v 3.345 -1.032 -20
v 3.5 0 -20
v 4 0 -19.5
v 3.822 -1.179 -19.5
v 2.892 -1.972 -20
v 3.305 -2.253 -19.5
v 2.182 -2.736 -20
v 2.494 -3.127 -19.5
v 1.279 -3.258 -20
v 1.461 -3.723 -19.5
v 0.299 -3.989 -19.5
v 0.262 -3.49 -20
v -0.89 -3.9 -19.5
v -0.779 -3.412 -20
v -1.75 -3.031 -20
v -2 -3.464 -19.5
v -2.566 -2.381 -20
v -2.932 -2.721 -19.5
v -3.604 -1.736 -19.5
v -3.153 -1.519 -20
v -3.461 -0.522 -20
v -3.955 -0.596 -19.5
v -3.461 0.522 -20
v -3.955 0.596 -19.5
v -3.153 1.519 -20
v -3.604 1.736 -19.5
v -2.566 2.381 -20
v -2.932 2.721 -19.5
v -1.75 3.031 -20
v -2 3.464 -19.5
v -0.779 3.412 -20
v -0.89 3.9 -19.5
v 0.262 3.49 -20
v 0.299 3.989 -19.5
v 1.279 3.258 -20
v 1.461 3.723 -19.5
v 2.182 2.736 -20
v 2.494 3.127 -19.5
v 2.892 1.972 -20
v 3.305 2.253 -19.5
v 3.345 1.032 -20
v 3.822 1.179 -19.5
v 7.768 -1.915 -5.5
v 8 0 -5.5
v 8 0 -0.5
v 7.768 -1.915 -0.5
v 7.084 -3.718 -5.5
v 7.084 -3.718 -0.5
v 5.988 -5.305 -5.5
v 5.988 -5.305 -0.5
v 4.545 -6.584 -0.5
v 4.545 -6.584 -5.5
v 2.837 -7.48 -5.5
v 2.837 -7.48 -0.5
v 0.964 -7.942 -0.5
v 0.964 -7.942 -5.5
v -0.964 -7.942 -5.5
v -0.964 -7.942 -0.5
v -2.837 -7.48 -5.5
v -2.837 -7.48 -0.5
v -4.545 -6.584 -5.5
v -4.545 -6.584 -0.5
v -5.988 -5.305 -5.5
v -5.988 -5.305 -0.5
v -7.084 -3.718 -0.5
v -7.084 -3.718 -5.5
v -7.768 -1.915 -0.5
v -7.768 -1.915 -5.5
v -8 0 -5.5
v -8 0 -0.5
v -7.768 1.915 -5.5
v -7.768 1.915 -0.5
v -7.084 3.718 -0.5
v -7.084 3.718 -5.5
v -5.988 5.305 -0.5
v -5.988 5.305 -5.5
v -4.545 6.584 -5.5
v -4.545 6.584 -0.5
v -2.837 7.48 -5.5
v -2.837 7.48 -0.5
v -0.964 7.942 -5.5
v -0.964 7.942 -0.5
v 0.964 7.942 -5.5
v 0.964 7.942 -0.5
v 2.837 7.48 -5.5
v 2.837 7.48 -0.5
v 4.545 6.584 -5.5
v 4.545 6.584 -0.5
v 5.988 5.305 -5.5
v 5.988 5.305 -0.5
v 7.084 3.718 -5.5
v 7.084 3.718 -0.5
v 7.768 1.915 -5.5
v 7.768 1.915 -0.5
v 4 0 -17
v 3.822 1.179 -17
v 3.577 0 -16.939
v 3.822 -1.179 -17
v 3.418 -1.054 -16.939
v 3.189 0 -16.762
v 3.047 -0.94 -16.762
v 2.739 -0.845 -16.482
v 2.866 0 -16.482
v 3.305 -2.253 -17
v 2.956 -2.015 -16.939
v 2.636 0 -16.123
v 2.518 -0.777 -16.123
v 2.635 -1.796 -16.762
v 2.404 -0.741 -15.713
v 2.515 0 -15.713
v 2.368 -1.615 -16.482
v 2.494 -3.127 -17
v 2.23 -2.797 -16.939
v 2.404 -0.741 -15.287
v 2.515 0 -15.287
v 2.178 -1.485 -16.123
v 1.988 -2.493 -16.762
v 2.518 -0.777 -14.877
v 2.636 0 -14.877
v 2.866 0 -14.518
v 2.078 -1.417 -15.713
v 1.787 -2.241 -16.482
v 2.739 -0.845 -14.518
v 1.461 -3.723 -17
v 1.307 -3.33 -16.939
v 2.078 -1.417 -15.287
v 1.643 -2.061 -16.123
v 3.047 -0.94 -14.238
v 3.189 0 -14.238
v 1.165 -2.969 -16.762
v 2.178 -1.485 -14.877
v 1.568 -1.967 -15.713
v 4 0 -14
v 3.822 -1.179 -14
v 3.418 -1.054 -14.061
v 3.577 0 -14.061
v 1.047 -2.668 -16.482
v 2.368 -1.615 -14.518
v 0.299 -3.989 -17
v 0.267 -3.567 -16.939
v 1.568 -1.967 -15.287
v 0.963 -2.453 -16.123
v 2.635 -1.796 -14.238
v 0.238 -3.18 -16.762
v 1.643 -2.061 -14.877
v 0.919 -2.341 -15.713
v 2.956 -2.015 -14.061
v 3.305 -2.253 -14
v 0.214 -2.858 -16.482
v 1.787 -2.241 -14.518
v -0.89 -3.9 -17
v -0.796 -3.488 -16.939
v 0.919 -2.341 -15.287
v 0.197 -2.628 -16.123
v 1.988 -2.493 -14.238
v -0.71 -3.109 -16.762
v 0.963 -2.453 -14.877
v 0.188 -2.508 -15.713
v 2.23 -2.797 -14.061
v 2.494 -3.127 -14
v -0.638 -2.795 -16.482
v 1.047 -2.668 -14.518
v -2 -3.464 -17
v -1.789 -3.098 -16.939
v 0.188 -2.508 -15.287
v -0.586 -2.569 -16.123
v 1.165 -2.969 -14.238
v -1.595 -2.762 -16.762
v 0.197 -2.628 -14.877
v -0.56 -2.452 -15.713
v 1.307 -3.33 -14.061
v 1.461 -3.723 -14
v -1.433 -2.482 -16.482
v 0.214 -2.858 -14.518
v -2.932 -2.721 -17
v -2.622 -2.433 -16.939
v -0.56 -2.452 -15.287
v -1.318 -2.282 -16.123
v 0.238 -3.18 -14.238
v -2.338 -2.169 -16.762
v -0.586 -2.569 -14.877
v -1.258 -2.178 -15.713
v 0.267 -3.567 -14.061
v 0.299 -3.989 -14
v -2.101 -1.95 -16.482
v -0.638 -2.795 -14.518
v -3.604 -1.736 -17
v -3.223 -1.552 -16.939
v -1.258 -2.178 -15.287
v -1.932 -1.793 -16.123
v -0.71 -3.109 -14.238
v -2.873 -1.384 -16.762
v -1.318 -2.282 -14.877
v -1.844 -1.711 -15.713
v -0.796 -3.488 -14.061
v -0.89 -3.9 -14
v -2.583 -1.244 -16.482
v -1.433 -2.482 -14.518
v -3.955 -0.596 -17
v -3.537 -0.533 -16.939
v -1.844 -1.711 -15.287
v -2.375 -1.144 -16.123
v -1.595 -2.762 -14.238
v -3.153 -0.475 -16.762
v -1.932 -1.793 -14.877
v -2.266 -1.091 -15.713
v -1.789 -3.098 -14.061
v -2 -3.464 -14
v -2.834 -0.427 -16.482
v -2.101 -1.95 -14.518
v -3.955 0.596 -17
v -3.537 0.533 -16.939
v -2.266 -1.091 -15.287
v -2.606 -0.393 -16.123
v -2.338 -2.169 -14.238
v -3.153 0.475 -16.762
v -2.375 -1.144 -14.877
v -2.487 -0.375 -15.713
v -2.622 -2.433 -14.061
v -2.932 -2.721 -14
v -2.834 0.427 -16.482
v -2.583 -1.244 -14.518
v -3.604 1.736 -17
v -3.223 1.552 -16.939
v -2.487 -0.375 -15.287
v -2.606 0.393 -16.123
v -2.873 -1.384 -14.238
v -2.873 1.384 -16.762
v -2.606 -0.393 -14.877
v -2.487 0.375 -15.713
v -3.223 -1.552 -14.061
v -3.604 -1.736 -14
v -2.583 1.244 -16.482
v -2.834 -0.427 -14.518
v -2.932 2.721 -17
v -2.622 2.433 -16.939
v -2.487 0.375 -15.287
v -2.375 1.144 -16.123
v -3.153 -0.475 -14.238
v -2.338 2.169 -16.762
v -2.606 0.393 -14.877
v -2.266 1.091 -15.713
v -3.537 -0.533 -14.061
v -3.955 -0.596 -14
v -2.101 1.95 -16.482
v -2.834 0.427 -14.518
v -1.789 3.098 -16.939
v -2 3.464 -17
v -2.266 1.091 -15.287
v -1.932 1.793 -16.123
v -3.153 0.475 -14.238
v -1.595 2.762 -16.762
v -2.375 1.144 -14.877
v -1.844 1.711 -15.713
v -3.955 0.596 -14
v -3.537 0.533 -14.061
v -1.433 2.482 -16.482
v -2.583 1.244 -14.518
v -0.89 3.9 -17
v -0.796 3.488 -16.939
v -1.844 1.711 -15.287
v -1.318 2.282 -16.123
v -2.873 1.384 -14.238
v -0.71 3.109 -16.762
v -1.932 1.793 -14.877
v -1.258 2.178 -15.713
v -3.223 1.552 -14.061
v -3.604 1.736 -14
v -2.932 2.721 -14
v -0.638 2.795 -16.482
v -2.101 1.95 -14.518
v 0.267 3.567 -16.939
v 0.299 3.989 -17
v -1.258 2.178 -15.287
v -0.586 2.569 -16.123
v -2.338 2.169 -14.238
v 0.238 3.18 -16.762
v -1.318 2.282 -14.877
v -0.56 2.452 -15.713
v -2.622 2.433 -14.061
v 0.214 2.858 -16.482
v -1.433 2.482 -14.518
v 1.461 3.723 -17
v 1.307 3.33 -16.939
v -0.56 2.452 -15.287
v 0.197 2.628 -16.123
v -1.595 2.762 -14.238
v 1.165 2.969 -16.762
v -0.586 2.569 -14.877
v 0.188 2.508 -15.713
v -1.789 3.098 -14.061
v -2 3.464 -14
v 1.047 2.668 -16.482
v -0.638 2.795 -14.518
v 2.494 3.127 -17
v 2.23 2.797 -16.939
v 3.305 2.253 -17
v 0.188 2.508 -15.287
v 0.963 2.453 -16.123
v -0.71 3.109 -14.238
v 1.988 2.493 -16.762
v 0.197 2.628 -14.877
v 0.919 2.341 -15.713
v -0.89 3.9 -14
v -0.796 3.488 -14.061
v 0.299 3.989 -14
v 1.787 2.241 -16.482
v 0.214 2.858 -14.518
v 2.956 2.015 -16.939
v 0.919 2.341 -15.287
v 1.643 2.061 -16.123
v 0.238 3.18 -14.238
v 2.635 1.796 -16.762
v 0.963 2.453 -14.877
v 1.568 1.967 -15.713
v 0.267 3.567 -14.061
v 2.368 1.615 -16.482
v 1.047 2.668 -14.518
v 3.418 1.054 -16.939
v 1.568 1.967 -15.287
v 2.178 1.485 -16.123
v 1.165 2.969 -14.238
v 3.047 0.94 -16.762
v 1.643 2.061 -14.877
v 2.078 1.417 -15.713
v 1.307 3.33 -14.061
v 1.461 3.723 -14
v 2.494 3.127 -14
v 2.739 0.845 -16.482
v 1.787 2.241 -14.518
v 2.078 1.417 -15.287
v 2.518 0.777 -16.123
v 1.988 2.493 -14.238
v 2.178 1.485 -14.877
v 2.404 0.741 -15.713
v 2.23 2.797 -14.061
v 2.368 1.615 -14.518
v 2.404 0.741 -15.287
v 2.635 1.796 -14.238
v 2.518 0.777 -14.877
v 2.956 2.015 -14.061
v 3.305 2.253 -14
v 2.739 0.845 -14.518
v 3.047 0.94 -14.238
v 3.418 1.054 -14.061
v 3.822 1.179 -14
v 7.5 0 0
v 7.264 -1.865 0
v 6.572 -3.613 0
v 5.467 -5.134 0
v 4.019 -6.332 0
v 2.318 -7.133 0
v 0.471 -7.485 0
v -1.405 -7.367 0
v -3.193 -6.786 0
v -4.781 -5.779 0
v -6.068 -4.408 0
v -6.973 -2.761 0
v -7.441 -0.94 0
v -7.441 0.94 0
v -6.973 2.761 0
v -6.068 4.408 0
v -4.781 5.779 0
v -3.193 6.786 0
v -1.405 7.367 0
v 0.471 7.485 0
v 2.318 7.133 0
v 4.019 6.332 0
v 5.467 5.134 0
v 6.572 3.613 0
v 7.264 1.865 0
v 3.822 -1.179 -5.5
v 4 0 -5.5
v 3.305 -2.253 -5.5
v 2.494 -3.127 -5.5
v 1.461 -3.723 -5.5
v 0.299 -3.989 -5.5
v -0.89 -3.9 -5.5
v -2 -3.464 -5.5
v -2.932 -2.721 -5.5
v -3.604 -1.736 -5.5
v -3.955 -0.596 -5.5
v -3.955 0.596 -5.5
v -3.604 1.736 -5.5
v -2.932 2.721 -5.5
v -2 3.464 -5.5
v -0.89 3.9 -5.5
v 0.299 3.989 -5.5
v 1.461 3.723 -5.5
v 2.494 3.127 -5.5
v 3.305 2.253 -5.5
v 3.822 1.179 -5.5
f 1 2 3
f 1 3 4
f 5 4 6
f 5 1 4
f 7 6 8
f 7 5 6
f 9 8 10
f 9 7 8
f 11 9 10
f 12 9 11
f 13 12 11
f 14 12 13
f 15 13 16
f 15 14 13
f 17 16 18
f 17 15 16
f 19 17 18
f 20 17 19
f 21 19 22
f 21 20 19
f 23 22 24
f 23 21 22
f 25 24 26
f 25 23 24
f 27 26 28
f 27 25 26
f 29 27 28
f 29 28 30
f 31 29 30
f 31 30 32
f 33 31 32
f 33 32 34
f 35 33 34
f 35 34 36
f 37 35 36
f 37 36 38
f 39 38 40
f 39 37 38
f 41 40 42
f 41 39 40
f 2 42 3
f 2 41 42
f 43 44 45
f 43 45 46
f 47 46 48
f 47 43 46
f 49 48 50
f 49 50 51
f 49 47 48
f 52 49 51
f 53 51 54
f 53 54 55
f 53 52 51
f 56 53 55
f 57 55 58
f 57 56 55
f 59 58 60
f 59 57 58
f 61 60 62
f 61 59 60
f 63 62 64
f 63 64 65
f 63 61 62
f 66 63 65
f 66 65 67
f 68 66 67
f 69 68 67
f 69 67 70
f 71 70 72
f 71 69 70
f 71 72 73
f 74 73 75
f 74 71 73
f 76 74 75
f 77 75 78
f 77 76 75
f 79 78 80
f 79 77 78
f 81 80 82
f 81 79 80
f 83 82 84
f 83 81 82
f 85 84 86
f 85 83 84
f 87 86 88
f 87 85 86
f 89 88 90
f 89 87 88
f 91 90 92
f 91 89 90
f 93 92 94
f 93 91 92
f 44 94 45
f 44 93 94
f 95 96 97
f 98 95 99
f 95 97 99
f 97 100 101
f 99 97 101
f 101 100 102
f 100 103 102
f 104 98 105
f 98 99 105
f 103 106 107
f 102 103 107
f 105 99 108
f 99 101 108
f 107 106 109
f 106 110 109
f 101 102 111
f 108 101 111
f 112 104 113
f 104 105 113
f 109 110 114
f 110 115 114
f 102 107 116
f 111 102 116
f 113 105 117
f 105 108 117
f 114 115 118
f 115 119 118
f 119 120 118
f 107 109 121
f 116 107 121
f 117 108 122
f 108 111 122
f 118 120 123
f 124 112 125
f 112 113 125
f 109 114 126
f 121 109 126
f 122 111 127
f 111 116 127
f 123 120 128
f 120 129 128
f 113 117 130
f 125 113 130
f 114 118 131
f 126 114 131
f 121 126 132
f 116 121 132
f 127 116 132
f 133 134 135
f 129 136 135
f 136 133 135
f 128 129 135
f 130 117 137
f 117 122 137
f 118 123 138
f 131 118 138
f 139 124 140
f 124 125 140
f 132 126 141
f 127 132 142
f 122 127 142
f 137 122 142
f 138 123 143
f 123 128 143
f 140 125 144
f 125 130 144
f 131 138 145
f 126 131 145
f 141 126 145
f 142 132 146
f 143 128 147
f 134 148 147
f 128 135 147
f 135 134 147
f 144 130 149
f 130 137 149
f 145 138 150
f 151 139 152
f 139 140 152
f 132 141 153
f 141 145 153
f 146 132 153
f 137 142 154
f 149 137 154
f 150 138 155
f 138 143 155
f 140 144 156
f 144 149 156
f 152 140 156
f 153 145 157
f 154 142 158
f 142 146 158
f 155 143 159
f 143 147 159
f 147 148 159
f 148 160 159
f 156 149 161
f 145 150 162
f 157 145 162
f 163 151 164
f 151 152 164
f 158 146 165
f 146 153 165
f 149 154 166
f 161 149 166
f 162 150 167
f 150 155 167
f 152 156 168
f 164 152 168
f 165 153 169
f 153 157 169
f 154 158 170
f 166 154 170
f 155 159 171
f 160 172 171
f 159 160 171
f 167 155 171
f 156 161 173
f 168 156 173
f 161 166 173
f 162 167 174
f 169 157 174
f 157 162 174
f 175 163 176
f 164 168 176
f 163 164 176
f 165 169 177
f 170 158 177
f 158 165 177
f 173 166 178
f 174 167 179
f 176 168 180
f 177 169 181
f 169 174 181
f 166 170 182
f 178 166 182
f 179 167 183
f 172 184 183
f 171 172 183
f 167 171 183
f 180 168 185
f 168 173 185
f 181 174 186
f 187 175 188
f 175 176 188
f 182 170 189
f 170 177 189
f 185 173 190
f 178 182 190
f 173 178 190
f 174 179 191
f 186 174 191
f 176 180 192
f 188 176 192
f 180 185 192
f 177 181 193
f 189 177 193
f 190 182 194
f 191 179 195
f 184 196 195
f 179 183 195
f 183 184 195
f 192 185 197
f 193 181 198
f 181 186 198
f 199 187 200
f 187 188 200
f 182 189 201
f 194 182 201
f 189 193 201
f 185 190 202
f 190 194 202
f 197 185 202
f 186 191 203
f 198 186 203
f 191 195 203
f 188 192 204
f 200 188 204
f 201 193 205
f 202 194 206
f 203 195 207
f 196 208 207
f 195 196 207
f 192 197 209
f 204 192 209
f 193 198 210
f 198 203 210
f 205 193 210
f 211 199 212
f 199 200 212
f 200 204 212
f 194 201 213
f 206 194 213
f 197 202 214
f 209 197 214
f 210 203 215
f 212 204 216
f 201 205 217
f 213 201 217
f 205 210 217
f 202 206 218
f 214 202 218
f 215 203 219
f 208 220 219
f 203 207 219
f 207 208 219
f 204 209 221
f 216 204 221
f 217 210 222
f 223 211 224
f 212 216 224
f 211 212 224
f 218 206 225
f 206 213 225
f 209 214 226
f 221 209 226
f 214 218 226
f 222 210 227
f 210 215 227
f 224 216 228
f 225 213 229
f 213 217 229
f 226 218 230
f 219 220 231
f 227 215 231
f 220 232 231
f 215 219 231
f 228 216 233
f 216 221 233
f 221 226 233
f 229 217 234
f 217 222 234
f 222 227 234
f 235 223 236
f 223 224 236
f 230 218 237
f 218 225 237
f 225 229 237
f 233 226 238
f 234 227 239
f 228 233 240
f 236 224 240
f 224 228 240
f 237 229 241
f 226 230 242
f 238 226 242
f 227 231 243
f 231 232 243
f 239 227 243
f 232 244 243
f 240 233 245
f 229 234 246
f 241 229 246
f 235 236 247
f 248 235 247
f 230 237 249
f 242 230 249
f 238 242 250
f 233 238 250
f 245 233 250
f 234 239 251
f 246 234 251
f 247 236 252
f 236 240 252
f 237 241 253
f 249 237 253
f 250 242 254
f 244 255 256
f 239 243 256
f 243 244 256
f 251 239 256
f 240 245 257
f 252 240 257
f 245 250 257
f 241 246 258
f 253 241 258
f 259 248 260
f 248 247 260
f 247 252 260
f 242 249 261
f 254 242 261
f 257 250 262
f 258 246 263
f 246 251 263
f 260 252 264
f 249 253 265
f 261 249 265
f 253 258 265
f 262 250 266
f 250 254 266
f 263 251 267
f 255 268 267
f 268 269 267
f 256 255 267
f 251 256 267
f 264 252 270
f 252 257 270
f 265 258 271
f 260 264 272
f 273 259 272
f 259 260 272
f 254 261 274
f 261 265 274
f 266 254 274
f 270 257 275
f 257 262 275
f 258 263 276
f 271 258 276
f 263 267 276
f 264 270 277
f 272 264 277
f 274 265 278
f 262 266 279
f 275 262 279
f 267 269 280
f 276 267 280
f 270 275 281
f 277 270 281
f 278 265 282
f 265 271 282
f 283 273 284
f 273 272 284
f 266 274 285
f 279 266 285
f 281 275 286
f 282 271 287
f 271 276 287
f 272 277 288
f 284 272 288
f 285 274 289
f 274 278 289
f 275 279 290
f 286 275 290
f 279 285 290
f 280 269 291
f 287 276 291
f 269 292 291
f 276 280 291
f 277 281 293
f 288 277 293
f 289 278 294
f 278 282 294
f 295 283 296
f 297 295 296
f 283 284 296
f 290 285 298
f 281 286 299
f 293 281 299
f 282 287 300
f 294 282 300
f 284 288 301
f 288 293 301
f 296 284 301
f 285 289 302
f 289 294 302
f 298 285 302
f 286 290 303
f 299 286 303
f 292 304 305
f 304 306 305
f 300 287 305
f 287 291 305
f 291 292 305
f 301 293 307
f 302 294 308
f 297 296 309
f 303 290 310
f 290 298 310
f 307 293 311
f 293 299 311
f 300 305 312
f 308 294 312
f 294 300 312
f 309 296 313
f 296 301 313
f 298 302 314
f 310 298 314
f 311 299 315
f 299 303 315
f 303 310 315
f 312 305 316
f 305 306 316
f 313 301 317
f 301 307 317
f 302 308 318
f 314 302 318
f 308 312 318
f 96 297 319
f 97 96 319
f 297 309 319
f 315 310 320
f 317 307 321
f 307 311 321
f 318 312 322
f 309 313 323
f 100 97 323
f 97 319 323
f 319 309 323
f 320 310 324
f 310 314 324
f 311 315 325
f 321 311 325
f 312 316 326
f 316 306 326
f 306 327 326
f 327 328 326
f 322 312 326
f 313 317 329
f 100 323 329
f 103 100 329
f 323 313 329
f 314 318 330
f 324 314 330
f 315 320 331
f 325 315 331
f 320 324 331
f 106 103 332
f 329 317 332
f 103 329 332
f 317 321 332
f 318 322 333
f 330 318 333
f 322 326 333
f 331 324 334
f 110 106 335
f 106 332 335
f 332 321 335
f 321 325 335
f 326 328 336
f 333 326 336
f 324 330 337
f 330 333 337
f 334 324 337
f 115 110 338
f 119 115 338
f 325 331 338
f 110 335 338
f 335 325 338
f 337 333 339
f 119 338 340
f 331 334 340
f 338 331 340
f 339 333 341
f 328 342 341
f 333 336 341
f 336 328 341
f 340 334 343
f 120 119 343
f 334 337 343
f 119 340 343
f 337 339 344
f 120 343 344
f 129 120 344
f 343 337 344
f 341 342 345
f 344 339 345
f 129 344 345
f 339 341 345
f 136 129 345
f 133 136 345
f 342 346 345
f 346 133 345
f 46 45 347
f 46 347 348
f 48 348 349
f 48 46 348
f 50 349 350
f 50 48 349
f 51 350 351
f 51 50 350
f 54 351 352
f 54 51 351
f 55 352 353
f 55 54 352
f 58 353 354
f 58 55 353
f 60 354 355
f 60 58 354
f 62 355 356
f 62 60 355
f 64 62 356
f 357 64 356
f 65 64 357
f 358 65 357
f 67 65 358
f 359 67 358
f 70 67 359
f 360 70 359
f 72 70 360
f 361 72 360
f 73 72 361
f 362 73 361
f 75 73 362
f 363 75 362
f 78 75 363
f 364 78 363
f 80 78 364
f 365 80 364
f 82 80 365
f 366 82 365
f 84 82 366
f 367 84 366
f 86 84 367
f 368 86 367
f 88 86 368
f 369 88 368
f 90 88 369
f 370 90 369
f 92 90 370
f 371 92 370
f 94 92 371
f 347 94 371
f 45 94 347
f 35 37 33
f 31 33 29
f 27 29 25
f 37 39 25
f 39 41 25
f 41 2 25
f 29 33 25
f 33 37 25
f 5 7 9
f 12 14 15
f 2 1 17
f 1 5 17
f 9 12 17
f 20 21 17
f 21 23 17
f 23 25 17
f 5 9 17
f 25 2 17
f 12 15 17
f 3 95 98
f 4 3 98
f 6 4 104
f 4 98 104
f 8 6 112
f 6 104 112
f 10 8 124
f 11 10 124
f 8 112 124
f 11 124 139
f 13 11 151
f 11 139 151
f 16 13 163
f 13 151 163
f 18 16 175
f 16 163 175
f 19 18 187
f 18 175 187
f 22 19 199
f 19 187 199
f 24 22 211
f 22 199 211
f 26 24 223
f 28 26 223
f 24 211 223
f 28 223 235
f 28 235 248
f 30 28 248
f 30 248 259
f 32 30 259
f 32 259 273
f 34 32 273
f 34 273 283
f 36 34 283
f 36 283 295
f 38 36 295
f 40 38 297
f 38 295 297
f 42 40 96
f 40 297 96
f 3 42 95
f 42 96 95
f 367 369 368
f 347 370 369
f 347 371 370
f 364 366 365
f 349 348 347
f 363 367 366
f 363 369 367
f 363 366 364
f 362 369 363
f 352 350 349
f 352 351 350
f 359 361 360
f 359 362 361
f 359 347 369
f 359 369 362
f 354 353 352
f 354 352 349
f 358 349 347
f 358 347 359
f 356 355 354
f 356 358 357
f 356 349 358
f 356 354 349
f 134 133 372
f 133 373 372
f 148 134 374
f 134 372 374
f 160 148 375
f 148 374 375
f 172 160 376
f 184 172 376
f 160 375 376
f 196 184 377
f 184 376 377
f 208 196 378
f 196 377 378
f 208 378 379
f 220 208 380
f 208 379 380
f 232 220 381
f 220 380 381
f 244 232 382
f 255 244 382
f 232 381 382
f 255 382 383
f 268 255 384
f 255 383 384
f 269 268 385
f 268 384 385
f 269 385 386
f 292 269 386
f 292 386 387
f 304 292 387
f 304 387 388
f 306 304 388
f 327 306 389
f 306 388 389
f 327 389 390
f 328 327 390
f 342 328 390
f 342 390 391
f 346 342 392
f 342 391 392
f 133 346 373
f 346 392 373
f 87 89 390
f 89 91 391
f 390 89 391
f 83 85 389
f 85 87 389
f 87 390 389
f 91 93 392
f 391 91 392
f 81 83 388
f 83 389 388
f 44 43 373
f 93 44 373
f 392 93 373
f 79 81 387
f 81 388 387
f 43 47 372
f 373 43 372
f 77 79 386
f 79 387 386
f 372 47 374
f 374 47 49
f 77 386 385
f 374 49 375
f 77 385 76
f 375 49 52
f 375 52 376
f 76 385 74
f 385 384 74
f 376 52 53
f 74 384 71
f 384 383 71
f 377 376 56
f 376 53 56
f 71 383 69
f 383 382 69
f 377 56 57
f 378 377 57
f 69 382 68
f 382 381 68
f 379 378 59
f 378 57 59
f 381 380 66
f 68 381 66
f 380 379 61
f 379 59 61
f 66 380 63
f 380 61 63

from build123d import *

# Parameters (mm, degrees)
SKETCH1_W     = 5.5
SKETCH1_H     = 8
CHAMFER1_SIZE = 0.5
CHAMFER2_SIZE = 0.5


with BuildPart() as part:
    # Sketch1 → Revolve1 (revolve)
    with BuildSketch(Plane(origin=(0, 0, 0), x_dir=(0, 0, -1), z_dir=(1, 0, 0)), mode=Mode.PRIVATE) as revolve1_sk:
        with Locations((2.75, 4)):
            Rectangle(SKETCH1_W, SKETCH1_H)
        with BuildLine():
            Line((5.5, 4), (5.5, 0))
            Line((5.5, 0), (20, 0))
            Line((20, 0), (20, 4))
            Line((20, 4), (17, 4))
            ThreePointArc((17, 4), (15.5, 2.5), (14, 4))
            Line((14, 4), (5.5, 4))
        make_face()
    revolve(revolve1_sk.sketch.rotate(Axis((0, 0, -5.5), (0, 0, -1)), 90), axis=Axis((0, 0, -5.5), (0, 0, -1)))

    # Chamfer1
    chamfer1_edges = [part.edges().sort_by_distance(p)[0] for p in [
        (-8, 0, 0),
    ]]
    chamfer(chamfer1_edges, length=CHAMFER1_SIZE)

    # Chamfer2
    chamfer2_edges = [part.edges().sort_by_distance(p)[0] for p in [
        (-4, 0, -20),
    ]]
    chamfer(chamfer2_edges, length=CHAMFER2_SIZE)


solid = part.part
